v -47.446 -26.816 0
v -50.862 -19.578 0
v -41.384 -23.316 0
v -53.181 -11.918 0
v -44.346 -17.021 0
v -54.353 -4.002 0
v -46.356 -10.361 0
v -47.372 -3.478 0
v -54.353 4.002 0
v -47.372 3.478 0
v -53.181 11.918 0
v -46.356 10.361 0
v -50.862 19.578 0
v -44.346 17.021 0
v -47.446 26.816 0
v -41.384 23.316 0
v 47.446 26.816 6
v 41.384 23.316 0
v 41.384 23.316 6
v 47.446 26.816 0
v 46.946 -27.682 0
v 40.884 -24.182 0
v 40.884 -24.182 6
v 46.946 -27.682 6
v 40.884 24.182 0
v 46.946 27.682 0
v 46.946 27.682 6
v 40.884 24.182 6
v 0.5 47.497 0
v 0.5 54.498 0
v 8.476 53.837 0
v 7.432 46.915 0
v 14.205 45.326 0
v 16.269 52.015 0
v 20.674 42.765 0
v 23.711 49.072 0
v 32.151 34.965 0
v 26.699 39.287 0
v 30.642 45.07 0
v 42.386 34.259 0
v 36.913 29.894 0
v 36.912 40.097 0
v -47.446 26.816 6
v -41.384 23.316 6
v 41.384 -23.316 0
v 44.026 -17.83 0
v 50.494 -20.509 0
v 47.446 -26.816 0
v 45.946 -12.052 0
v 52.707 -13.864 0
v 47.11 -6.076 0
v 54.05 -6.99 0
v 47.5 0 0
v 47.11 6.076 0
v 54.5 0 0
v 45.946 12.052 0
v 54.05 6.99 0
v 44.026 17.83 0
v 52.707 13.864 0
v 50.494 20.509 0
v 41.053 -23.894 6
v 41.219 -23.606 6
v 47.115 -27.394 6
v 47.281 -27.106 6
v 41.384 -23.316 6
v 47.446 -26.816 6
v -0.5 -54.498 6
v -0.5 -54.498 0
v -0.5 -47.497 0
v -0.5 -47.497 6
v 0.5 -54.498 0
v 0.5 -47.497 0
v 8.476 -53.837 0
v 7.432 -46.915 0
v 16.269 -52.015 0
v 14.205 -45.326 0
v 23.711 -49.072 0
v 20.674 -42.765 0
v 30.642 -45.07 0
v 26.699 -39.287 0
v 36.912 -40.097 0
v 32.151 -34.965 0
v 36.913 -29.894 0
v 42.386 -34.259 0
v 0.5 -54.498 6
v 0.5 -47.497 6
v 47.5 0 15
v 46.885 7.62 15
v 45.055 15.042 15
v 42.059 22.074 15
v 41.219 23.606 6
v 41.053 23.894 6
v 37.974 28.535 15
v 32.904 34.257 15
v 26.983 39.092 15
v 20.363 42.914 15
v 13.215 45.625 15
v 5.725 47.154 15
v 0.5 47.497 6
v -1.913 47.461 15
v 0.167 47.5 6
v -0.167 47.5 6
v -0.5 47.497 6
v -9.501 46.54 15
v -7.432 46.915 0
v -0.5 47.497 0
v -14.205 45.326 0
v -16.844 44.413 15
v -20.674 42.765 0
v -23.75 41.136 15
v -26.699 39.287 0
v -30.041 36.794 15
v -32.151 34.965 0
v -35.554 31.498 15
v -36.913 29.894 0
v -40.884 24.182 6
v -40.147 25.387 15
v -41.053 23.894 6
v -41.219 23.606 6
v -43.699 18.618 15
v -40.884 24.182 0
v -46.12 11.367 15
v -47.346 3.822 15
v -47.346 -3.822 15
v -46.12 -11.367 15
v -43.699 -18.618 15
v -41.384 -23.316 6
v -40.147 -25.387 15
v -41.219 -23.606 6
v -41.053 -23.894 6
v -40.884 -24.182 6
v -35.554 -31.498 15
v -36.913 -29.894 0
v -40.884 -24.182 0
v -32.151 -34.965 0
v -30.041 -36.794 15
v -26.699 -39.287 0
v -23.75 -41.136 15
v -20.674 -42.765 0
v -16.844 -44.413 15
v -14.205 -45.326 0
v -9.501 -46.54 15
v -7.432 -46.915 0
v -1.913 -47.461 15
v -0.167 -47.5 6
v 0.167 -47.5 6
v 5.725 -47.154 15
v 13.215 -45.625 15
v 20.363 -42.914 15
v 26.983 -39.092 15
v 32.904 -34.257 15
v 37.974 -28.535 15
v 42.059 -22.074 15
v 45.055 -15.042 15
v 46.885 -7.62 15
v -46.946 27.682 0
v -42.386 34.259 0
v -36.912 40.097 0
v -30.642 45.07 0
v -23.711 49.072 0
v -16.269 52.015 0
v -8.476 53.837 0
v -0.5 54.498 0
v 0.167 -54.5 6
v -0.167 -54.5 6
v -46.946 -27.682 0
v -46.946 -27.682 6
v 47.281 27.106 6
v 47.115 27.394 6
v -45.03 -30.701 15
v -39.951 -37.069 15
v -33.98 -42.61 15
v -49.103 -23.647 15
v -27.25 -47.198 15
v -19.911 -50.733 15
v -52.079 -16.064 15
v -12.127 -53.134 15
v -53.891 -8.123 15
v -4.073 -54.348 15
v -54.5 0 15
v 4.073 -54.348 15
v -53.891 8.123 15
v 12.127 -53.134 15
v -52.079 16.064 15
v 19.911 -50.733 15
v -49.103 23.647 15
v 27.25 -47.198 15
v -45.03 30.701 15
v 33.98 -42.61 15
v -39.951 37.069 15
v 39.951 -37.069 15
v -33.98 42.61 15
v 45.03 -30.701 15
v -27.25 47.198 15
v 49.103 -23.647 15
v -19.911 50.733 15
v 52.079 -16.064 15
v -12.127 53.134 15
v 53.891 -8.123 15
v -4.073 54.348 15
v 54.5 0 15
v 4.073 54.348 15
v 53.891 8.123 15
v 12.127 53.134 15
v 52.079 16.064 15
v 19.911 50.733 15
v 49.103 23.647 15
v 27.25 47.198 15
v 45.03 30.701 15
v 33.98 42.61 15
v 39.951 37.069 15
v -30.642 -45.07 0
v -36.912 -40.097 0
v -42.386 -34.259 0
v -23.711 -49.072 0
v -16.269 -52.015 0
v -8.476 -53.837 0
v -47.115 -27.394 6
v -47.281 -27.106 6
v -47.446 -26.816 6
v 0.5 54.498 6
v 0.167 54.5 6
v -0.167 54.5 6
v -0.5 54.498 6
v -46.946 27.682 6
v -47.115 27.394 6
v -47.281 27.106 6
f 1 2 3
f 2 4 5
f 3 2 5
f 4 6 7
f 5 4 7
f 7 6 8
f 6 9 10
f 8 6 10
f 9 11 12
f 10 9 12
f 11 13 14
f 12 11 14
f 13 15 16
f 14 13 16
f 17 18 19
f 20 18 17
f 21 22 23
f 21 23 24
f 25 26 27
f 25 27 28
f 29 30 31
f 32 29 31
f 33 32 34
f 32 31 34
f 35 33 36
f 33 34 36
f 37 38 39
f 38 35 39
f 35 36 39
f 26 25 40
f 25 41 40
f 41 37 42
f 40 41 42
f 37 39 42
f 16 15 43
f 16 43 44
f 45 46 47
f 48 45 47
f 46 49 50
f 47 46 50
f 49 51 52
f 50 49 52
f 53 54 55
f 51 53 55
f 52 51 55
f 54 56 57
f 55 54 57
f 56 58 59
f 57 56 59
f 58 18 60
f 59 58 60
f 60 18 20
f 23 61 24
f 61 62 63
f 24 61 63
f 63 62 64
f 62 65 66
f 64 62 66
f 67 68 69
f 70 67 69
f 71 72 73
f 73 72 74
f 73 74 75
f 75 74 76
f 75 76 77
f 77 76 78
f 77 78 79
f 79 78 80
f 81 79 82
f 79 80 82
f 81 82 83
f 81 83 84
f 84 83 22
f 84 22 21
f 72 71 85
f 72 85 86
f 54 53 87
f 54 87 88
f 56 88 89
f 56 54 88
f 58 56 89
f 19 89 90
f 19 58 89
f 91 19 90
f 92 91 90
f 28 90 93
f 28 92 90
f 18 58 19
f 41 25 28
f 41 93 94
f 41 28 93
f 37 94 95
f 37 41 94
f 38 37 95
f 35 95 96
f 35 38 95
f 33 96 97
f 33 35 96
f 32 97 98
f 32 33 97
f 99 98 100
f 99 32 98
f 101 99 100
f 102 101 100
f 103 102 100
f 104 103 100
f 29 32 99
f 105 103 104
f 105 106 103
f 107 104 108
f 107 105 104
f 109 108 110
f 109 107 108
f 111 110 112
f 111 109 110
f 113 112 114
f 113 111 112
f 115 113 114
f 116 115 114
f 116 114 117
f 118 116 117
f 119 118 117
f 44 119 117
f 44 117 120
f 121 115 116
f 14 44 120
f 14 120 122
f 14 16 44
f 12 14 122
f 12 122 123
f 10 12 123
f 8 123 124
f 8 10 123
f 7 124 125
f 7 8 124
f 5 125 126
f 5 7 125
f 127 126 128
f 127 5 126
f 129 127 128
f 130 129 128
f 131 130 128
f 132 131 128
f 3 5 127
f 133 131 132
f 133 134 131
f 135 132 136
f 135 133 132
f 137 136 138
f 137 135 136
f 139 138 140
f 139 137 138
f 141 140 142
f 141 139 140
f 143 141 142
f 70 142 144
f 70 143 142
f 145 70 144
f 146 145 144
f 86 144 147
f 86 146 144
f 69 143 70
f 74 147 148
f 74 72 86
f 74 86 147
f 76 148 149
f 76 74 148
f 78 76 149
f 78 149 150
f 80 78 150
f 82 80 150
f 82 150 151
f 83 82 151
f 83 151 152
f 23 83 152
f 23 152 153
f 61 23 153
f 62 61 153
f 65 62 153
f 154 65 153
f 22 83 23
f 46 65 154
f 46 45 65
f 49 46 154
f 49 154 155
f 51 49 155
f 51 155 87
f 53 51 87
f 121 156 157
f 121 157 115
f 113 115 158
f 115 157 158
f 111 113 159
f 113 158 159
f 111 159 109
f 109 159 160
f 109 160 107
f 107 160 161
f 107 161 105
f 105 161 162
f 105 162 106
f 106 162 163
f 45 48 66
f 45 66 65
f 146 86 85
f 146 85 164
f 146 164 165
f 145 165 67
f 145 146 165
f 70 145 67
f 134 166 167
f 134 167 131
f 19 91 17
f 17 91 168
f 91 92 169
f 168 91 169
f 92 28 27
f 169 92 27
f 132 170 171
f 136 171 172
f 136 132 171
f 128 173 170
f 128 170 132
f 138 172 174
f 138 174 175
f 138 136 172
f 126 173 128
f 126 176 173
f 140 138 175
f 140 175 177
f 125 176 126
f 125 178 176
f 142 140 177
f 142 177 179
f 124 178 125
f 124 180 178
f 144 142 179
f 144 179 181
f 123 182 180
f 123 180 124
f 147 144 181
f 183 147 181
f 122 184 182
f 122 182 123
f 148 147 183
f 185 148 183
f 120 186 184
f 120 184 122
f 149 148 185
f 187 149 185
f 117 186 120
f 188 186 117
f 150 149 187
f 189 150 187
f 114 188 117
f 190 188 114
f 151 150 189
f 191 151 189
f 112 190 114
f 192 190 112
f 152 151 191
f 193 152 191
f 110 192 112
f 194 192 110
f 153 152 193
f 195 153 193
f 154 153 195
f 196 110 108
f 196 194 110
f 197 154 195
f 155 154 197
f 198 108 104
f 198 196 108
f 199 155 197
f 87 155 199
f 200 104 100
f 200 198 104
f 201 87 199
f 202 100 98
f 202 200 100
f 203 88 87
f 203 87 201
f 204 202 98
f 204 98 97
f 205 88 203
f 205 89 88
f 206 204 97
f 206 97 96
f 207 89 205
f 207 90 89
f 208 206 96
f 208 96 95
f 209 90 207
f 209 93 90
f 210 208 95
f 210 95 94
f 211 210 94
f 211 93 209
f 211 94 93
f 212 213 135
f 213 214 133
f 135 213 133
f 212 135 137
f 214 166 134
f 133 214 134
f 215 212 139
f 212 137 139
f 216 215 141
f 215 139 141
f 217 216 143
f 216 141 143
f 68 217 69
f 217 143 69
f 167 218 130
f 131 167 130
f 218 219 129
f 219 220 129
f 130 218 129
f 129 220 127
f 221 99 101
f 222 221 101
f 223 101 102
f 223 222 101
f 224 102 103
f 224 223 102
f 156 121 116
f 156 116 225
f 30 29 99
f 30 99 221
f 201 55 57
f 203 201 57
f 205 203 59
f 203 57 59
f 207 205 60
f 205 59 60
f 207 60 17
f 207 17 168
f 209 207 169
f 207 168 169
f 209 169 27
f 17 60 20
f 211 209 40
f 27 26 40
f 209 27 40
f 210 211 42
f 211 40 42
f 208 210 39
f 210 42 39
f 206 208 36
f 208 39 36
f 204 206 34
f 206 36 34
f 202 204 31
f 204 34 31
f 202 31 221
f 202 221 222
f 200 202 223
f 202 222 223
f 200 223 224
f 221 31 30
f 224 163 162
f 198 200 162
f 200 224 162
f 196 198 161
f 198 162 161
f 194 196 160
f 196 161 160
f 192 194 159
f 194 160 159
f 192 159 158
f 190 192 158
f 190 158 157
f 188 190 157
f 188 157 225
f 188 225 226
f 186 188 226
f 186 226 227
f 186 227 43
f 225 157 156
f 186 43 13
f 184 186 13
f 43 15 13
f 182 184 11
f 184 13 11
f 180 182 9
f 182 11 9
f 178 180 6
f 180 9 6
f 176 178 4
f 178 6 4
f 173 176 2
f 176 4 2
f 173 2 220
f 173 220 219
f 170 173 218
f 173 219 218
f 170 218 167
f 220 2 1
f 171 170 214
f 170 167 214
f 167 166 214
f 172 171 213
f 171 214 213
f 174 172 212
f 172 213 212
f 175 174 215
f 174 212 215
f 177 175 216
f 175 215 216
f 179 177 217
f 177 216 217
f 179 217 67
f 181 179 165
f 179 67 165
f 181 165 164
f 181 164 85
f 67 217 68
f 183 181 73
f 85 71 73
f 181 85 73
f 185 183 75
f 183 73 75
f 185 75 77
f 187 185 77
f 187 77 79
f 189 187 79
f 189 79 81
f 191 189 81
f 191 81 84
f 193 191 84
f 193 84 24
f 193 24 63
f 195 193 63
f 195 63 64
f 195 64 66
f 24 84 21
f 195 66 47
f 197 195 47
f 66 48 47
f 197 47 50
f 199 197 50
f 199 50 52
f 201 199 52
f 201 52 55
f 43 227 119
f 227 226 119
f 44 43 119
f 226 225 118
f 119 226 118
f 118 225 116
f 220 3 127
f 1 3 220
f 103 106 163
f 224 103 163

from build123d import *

# Parameters (mm, degrees)
ESQUISSE1_R             = 54.5
ESQUISSE1_R_2           = 47.5
BOSS_EXTRU_1_DEPTH      = 15
ESQUISSE2_W             = 1
ESQUISSE2_H             = 10.244333075
ENL_V_MAT_EXTRU_1_DEPTH = 6


with BuildPart() as part:
    # Esquisse1 → Boss.-Extru.1 (new body)
    with BuildSketch(Plane.XY):
        Circle(ESQUISSE1_R)
        Circle(ESQUISSE1_R_2, mode=Mode.SUBTRACT)
    extrude(amount=BOSS_EXTRU_1_DEPTH)

    # Esquisse2 → Enlèv. mat.-Extru.1 (cut)
    with BuildSketch(Plane(origin=(0, 0, 0), x_dir=(-1, 0, 0), z_dir=(0, 0, -1))):
        Polygon((48.965976814, 27.693169625), (40.094124126, 22.571003088), (39.594124126, 23.437028491), (48.465976814, 28.559195029), align=None)
        with Locations((0, 51.130198117)):
            Rectangle(ESQUISSE2_W, ESQUISSE2_H)
        Polygon((48.465976814, -28.559195029), (39.594124126, -23.437028491), (40.094124126, -22.571003088), (48.965976814, -27.693169625), align=None)
        with Locations((0, -51.130198117)):
            Rectangle(ESQUISSE2_W, ESQUISSE2_H)
        Polygon((-48.965976814, -27.693169625), (-40.094124126, -22.571003088), (-39.594124126, -23.437028491), (-48.465976814, -28.559195029), align=None)
        Polygon((-48.465976814, 28.559195029), (-39.594124126, 23.437028491), (-40.094124126, 22.571003088), (-48.965976814, 27.693169625), align=None)
    extrude(amount=-ENL_V_MAT_EXTRU_1_DEPTH, mode=Mode.SUBTRACT)


solid = part.part
